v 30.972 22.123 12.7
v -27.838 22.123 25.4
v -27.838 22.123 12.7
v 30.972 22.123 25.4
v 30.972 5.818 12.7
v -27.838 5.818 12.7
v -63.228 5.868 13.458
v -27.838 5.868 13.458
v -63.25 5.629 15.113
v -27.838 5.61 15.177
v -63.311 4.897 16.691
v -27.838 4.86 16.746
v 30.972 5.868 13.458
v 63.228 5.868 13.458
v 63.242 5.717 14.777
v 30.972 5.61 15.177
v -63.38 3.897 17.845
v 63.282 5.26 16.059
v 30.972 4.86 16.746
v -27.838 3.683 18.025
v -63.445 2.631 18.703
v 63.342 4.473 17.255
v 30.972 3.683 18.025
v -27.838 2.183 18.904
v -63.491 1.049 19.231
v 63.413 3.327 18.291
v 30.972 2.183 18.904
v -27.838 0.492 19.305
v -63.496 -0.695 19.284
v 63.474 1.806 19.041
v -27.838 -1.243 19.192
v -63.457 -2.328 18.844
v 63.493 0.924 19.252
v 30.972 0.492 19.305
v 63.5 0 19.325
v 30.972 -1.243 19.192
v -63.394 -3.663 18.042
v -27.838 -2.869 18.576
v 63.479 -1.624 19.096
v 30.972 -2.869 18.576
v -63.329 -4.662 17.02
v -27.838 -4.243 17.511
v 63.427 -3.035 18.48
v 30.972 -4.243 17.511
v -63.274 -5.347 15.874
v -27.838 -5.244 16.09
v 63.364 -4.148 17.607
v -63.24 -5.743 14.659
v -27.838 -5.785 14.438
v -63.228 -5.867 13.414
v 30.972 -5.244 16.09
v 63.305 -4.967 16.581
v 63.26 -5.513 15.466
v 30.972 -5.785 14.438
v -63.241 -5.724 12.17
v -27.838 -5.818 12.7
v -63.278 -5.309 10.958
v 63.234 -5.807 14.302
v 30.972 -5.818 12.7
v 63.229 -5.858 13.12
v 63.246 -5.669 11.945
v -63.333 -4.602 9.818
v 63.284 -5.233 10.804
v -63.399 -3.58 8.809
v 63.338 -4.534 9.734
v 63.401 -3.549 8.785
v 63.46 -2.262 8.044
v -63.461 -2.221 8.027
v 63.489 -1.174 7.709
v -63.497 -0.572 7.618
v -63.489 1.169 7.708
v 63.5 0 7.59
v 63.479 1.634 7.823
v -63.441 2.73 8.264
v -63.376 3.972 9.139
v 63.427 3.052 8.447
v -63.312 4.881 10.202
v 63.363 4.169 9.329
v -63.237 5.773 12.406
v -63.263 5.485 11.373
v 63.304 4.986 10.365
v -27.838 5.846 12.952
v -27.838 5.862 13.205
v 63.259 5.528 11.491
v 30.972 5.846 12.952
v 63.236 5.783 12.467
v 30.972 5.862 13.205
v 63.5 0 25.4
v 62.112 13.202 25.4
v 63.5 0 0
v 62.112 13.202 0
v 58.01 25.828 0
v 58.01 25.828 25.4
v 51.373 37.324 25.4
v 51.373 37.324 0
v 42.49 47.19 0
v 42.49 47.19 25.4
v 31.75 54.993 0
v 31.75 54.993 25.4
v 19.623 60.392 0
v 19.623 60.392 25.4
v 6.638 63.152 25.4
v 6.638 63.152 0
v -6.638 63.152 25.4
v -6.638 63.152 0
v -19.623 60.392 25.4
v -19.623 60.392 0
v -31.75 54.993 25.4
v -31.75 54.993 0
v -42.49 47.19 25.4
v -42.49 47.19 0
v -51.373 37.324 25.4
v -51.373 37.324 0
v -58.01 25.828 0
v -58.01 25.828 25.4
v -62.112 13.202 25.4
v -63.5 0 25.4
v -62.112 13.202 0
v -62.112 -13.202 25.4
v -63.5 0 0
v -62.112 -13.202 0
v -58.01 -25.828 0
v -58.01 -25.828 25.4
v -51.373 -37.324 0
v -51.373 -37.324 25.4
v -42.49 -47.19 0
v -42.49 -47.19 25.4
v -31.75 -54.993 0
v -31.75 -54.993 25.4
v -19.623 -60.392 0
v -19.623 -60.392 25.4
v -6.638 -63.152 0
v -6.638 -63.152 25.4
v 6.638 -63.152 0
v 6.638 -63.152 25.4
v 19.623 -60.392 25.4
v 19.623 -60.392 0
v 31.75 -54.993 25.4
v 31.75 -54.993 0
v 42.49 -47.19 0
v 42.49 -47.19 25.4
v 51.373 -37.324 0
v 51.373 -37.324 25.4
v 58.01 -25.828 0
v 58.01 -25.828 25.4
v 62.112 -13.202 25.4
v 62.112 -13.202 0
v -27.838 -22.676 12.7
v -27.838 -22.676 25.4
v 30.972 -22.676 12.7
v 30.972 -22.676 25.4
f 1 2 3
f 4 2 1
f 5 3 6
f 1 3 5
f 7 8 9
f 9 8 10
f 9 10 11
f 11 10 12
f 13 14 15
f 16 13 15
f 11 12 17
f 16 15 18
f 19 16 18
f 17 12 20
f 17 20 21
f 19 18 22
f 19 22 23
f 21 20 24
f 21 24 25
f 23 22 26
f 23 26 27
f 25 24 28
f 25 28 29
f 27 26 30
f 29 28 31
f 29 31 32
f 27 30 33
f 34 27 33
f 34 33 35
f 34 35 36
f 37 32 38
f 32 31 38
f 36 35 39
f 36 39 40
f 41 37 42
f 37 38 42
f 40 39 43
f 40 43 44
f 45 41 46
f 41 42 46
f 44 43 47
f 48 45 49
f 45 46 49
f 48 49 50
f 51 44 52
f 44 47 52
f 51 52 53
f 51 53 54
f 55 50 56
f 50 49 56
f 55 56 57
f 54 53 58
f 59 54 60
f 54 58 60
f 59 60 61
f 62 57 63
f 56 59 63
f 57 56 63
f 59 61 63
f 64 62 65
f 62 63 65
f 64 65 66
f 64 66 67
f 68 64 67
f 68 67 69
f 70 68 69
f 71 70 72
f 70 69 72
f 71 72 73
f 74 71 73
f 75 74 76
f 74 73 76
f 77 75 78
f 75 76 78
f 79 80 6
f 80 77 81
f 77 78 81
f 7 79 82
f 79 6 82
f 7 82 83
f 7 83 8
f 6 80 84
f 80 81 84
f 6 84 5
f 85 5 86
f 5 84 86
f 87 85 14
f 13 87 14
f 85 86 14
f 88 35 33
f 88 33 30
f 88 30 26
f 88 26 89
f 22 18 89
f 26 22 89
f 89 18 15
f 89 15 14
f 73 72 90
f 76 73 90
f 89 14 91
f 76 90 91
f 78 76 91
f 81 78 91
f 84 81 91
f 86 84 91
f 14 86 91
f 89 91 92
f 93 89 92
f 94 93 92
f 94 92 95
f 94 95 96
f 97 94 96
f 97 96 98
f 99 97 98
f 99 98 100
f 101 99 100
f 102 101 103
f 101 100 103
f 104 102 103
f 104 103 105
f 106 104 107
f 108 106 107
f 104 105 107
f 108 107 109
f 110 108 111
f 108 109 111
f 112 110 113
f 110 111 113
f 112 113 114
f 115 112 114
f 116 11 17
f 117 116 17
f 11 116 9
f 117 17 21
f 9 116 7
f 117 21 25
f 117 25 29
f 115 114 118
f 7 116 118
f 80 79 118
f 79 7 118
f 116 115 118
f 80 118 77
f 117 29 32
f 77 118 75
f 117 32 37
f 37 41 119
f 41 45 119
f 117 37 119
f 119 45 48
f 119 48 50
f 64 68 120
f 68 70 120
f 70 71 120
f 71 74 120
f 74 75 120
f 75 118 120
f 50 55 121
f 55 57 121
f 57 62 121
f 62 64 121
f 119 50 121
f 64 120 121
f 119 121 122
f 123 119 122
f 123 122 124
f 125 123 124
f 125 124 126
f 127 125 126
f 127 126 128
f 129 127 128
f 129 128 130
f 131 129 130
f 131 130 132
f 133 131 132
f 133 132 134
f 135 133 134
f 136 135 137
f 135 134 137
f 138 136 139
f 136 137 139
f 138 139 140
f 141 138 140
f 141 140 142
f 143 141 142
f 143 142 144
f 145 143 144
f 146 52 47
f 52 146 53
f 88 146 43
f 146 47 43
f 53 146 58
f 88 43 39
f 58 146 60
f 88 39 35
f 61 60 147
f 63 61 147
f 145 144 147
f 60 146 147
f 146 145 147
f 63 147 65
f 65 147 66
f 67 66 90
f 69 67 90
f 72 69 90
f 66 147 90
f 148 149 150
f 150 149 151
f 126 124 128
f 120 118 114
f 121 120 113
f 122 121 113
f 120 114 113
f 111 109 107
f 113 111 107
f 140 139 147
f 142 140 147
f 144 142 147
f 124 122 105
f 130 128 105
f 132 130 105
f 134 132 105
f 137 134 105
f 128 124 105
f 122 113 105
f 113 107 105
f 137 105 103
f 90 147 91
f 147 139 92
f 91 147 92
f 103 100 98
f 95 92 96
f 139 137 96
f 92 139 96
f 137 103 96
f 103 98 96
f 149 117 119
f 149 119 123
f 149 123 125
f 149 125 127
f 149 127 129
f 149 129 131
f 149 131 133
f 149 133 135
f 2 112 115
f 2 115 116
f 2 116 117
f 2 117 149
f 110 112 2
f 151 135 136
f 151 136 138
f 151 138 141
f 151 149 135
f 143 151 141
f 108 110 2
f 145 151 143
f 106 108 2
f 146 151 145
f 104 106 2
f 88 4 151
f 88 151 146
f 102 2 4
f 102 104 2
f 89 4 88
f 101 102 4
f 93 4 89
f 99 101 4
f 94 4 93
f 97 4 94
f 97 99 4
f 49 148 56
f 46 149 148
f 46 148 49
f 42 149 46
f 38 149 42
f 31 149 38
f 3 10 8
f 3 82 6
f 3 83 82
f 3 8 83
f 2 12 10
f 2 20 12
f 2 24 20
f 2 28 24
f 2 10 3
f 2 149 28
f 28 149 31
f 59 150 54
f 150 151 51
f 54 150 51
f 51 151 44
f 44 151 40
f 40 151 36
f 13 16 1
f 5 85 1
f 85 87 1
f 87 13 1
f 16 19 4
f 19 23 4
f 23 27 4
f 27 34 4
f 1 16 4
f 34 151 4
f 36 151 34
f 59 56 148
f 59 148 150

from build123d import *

# Parameters (mm, degrees)
F0_R     = 63.5
F1_DEPTH = 25.4
F2_W     = 58.809195
F2_H     = 44.798226
F3_DEPTH = 12.7
F4_R     = 5.867583
F5_DEPTH = 127


with BuildPart() as f1:
    # F0 (on Top) → F1 (new body)
    with BuildSketch(Plane.XY):
        Circle(F0_R)
    extrude(amount=F1_DEPTH)

    # F2 (on face) → F3 (cut)
    with BuildSketch(Plane.XY.offset(25.4)):
        with Locations((1.567016, -0.276532)):
            Rectangle(F2_W, F2_H)
    extrude(amount=-F3_DEPTH, mode=Mode.SUBTRACT)

    # F4 (on Right) → F5 (cut, symmetric)
    with BuildSketch(Plane.YZ):
        with Locations((0, 13.457903)):
            Circle(F4_R)
    extrude(amount=F5_DEPTH, both=True, mode=Mode.SUBTRACT)


solid = f1.part
